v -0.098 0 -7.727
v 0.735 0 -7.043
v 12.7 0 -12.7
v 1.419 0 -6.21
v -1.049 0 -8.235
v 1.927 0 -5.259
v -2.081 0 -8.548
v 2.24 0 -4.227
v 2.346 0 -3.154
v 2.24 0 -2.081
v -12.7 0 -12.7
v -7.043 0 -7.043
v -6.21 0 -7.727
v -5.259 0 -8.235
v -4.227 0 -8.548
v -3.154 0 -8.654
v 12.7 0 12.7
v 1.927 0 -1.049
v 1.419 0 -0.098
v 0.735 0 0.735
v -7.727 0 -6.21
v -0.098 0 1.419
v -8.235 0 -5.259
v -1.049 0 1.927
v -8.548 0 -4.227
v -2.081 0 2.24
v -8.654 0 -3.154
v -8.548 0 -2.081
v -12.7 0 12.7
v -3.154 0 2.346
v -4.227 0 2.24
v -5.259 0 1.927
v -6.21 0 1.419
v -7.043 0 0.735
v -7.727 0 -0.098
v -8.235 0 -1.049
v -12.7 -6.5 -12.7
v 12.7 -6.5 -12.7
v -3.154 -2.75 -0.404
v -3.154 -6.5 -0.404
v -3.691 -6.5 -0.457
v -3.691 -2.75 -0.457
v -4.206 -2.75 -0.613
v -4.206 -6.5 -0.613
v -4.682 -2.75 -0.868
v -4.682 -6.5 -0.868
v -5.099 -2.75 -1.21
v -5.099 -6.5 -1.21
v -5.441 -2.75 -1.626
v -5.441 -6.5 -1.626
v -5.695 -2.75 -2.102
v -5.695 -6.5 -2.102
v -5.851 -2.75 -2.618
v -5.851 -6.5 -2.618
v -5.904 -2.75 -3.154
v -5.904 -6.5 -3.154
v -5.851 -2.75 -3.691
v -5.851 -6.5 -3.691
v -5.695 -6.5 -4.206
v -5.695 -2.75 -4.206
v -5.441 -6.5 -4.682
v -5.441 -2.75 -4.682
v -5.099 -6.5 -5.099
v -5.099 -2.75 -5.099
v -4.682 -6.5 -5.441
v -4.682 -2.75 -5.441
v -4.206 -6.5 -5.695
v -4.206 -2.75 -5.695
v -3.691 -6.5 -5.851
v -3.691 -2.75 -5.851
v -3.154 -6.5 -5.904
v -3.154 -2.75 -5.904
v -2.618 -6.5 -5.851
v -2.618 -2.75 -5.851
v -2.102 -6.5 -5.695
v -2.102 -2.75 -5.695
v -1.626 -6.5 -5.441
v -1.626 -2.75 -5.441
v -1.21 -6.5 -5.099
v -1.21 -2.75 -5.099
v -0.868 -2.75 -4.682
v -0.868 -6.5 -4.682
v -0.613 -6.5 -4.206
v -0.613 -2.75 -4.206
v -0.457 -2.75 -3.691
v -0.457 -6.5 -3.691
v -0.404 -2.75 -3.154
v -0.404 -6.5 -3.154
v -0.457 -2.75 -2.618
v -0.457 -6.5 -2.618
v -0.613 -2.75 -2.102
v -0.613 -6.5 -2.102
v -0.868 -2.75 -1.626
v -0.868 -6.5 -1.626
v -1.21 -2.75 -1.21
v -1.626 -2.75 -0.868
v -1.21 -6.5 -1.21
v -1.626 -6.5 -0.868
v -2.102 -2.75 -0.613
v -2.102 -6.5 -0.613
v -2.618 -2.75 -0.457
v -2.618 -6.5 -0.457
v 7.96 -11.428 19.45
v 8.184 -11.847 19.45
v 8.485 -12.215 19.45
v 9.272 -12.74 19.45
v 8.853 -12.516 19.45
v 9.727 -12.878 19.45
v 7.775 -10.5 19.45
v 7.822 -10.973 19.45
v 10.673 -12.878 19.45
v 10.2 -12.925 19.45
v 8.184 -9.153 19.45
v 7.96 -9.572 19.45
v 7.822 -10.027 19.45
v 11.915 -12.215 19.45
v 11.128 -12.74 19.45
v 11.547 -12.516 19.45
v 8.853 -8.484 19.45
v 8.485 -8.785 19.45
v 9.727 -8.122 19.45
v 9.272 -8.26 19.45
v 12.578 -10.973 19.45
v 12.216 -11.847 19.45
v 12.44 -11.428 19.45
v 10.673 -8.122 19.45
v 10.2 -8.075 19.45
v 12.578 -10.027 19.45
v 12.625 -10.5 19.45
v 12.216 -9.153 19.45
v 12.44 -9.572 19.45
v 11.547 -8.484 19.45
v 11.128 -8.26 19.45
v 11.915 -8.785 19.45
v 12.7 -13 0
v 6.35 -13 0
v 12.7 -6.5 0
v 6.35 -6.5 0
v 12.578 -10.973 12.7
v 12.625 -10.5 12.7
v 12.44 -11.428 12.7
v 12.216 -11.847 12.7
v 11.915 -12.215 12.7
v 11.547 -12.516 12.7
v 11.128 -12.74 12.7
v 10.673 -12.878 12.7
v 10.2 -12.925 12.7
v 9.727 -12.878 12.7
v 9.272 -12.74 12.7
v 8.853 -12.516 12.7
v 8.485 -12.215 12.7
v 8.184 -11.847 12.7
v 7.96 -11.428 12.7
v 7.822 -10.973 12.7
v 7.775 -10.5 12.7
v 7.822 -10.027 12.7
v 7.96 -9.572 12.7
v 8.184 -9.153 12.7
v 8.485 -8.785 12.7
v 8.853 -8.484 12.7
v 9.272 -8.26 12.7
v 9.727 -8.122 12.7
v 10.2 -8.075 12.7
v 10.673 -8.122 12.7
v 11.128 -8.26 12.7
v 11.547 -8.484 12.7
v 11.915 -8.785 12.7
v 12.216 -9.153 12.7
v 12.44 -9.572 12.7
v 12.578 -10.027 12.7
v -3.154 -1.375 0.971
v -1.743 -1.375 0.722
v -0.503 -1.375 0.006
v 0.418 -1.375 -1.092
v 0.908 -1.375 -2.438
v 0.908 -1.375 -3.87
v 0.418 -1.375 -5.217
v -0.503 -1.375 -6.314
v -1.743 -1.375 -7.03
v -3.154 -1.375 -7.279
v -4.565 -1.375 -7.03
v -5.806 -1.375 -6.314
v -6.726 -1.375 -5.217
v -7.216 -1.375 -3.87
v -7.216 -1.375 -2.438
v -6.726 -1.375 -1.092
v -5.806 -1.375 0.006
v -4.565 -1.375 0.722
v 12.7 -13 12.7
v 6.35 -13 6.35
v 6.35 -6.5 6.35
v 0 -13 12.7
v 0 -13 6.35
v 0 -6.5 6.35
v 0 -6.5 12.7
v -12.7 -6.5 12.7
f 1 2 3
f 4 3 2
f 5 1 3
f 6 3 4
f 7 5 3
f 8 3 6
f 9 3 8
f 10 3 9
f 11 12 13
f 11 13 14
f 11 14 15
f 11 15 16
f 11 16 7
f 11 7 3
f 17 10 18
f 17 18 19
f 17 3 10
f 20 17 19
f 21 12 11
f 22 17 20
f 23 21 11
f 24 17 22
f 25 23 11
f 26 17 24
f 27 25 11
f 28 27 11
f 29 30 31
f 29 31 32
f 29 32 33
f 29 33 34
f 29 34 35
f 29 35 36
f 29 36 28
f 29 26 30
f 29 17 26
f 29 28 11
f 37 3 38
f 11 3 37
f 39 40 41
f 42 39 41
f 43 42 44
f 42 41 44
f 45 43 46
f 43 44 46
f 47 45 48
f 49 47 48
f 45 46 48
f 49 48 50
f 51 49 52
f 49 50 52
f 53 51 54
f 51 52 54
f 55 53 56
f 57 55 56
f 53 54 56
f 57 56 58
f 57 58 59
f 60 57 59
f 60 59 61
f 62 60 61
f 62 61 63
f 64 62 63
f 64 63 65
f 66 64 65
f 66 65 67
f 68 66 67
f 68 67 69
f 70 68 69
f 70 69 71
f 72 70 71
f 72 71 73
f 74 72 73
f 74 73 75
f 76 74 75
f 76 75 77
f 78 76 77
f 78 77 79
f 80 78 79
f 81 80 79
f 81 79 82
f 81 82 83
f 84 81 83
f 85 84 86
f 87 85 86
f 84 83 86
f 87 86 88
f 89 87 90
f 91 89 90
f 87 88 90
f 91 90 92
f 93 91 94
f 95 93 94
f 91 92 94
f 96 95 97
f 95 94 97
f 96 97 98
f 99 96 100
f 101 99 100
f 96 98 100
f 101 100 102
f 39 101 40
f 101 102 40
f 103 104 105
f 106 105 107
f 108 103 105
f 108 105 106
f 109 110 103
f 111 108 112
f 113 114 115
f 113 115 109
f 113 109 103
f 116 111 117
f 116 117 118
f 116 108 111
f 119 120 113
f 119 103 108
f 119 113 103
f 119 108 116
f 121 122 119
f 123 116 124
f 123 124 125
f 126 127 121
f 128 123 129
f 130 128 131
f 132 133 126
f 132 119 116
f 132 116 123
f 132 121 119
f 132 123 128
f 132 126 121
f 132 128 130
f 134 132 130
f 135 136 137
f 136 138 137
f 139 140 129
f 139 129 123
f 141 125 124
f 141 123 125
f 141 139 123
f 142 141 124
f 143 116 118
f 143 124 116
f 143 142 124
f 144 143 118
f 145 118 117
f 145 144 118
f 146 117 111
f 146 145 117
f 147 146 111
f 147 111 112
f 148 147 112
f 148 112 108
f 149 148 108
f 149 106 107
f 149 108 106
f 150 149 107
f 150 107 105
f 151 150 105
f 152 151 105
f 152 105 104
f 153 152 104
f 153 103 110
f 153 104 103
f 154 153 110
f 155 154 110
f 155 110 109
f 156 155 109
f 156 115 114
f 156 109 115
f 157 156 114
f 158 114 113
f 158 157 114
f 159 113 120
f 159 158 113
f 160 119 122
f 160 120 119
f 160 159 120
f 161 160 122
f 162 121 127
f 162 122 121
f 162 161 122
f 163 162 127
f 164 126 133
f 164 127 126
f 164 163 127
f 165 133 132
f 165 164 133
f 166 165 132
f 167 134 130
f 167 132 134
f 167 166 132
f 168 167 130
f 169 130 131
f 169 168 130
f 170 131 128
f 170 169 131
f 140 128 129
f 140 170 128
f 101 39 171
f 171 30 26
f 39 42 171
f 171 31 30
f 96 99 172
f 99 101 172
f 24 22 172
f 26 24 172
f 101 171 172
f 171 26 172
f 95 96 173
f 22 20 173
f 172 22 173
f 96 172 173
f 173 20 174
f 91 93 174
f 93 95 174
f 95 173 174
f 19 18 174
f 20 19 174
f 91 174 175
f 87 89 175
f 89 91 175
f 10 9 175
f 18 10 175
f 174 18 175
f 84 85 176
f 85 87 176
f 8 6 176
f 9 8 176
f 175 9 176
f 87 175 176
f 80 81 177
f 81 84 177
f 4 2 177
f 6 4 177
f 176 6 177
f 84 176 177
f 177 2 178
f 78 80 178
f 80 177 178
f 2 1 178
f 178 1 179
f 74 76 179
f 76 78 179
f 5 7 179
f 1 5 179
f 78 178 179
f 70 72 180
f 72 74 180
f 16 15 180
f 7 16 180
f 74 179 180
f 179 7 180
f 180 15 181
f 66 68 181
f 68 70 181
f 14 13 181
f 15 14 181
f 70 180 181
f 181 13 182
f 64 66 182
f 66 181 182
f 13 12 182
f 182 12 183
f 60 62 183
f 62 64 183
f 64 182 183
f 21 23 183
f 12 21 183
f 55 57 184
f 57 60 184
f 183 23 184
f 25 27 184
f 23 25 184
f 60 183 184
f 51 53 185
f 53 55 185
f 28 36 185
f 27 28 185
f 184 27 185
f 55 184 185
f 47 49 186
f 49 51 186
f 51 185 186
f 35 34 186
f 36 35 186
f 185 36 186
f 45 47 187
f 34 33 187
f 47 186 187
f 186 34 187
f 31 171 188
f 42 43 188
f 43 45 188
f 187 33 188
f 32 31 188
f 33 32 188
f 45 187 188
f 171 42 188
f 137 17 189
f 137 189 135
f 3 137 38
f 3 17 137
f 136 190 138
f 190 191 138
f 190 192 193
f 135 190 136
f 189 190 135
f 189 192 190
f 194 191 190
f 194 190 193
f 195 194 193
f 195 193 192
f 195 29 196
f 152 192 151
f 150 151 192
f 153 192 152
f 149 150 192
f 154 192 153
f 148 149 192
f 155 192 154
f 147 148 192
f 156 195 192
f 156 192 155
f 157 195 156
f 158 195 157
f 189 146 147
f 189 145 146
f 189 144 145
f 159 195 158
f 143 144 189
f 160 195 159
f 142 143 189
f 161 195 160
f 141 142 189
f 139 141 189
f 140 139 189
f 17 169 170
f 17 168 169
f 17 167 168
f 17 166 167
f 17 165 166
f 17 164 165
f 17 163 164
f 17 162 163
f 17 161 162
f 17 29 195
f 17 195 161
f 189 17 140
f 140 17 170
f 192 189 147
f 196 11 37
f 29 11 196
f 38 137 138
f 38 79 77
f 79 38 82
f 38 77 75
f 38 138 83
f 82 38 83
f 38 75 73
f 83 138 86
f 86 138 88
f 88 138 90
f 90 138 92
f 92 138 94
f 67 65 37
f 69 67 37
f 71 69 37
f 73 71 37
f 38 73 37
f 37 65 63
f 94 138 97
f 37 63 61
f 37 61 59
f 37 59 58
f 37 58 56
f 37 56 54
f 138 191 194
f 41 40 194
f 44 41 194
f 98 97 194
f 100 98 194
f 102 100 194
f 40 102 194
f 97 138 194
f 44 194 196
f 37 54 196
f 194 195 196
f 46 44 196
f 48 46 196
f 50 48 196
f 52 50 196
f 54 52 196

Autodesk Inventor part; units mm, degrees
ref_plane "YZ Plane" through (0, 0, 0) normal (1, 0, 0) x (0, 1, 0)
ref_plane "XZ Plane" through (0, 0, 0) normal (0, 1, 0) x (-1, 0, 0)
ref_plane "XY Plane" through (0, 0, 0) normal (0, 0, 1) x (1, 0, 0)
sketch "Sketch2" plane through (0, 0, 0) normal (0, 1, 0) x (-1, 0, 0)
  line L0 (12.7, 12.7) -> (-12.7, 12.7)
  line L1 (-12.7, 12.7) -> (-12.7, -12.7)
  line L2 (-12.7, -12.7) -> (12.7, -12.7)
  line L3 (12.7, -12.7) -> (12.7, 12.7)
  line L4 (12.7, 0) -> (-12.7, 0) construction
  line L5 (0, -12.7) -> (0, 12.7) construction
  point P0 (0, 0)
  point P1 (0, 0)
  dimension "d2" = 25.4
  dimension "d3" = 25.4
extrude "Base" add sketch "Sketch2" against normal blind 6.5
sketch "Sketch3" plane through (0, -6.5, 0) normal (0, -1, 0) x (1, 0, 0)
  line L0 (12.7, 12.7) -> (-12.7, 12.7) projected
  line L1 (12.7, 12.7) -> (6.35, 12.7)
  line L2 (6.35, 12.7) -> (6.35, 0)
  line L3 (6.35, 0) -> (12.7, 0)
  line L4 (12.7, 0) -> (12.7, 12.7)
  line L5 (0, 12.7) -> (6.35, 12.7)
  line L6 (6.35, 12.7) -> (6.35, 6.35)
  line L7 (6.35, 6.35) -> (0, 6.35)
  line L8 (0, 6.35) -> (0, 12.7)
  line L9 (-12.7, 12.7) -> (-12.7, -12.7) projected
  line L10 (12.7, 12.7) -> (-12.7, 12.7)
  line L11 (-12.7, 12.7) -> (-12.7, -12.7)
  line L12 (-12.7, -12.7) -> (12.7, -12.7)
  line L13 (12.7, -12.7) -> (12.7, 12.7)
  point P0 (0, 0)
  dimension "d6" = 6.35
  dimension "d7" = 12.7
extrude "Back extrusion" add sketch "Sketch3" along normal blind 6.5 contours L4 L3 L2 L0 | L2 L7 L8 L0
sketch "Sketch5" plane through (-12.7, 0, 12.7) normal (0, 0, 1) x (1, 0, 0)
  line L0 (12.7, -6.5) -> (0, -6.5) projected
  line L1 (25.4, -6.5) -> (25.4, -13) projected
  line L2 (12.7, -6.5) -> (25.4, -6.5) construction
  line L3 (25.4, -13) -> (12.7, -13) projected
  line L4 (25.4, -13) -> (20.4, -13) construction
  line L5 (20.4, -13) -> (20.4, -8) construction
  line L6 (20.4, -8) -> (25.4, -8) construction
  line L7 (25.4, -8) -> (25.4, -13) construction
  line L8 (20.4, -8) -> (25.4, -13) construction
  line L9 (20.4, -13) -> (25.4, -8) construction
  circle A0 centre (22.9, -10.5) radius 2.425
  point P0 (12.7, 0)
  dimension "d10" = 5
  dimension "d11" = 5
  dimension "d12" = 4.85
extrude "Extrusion3" add sketch "Sketch5" along normal blind 6.75
sketch "Sketch6" plane through (0, -6.5, 0) normal (0, -1, 0) x (1, 0, 0)
  line L0 (-12.7, 12.7) -> (-12.7, -12.7) projected
  line L1 (-12.7, -12.7) -> (-4.9218, -4.9218) construction
  line L2 (-12.7, -12.7) -> (-1.7, -12.7) construction
  line L3 (-4.9218, -4.9218) -> (-3.1541, -3.1541) construction
  line L4 (-4.9218, -4.9218) -> (-2.4218, -4.9218) construction
  circle A0 centre (-3.1541, -3.1541) radius 2.5
  point P0 (0, 0)
  dimension "d15" = 11
  dimension "d16" = 45
  dimension "d17" = 2.5
  dimension "d18" = 45
sketch "Sketch7" plane through (0, 0, 0) normal (0, 1, 0) x (1, 0, 0)
  line L0 (-12.7, -12.7) -> (-12.7, 12.7) projected
  line L1 (-12.7, 12.7) -> (-7.0431, 7.0431) construction
  line L2 (-12.7, 12.7) -> (-4.7, 12.7) construction
  line L3 (-7.0431, 7.0431) -> (-3.1541, 3.1541) construction
  line L4 (-7.0431, 7.0431) -> (-1.5431, 7.0431) construction
  circle A0 centre (-3.1541, 3.1541) radius 5.5
  point P0 (0, 0)
  dimension "d19" = 8
  dimension "d20" = 45
  dimension "d21" = 5.5
  dimension "d22" = 45
hole "Hole1" at (-3.1541, 0, -3.1541) direction (0, -1, 0) diameter 5.5 end through all countersink diameter 11 countersink angle 90
equation "\"d3\" = d2"
equation "\"d7\" = 2 * d6"
equation "\"d11\" = d10"
properties part number "Door pin right"
